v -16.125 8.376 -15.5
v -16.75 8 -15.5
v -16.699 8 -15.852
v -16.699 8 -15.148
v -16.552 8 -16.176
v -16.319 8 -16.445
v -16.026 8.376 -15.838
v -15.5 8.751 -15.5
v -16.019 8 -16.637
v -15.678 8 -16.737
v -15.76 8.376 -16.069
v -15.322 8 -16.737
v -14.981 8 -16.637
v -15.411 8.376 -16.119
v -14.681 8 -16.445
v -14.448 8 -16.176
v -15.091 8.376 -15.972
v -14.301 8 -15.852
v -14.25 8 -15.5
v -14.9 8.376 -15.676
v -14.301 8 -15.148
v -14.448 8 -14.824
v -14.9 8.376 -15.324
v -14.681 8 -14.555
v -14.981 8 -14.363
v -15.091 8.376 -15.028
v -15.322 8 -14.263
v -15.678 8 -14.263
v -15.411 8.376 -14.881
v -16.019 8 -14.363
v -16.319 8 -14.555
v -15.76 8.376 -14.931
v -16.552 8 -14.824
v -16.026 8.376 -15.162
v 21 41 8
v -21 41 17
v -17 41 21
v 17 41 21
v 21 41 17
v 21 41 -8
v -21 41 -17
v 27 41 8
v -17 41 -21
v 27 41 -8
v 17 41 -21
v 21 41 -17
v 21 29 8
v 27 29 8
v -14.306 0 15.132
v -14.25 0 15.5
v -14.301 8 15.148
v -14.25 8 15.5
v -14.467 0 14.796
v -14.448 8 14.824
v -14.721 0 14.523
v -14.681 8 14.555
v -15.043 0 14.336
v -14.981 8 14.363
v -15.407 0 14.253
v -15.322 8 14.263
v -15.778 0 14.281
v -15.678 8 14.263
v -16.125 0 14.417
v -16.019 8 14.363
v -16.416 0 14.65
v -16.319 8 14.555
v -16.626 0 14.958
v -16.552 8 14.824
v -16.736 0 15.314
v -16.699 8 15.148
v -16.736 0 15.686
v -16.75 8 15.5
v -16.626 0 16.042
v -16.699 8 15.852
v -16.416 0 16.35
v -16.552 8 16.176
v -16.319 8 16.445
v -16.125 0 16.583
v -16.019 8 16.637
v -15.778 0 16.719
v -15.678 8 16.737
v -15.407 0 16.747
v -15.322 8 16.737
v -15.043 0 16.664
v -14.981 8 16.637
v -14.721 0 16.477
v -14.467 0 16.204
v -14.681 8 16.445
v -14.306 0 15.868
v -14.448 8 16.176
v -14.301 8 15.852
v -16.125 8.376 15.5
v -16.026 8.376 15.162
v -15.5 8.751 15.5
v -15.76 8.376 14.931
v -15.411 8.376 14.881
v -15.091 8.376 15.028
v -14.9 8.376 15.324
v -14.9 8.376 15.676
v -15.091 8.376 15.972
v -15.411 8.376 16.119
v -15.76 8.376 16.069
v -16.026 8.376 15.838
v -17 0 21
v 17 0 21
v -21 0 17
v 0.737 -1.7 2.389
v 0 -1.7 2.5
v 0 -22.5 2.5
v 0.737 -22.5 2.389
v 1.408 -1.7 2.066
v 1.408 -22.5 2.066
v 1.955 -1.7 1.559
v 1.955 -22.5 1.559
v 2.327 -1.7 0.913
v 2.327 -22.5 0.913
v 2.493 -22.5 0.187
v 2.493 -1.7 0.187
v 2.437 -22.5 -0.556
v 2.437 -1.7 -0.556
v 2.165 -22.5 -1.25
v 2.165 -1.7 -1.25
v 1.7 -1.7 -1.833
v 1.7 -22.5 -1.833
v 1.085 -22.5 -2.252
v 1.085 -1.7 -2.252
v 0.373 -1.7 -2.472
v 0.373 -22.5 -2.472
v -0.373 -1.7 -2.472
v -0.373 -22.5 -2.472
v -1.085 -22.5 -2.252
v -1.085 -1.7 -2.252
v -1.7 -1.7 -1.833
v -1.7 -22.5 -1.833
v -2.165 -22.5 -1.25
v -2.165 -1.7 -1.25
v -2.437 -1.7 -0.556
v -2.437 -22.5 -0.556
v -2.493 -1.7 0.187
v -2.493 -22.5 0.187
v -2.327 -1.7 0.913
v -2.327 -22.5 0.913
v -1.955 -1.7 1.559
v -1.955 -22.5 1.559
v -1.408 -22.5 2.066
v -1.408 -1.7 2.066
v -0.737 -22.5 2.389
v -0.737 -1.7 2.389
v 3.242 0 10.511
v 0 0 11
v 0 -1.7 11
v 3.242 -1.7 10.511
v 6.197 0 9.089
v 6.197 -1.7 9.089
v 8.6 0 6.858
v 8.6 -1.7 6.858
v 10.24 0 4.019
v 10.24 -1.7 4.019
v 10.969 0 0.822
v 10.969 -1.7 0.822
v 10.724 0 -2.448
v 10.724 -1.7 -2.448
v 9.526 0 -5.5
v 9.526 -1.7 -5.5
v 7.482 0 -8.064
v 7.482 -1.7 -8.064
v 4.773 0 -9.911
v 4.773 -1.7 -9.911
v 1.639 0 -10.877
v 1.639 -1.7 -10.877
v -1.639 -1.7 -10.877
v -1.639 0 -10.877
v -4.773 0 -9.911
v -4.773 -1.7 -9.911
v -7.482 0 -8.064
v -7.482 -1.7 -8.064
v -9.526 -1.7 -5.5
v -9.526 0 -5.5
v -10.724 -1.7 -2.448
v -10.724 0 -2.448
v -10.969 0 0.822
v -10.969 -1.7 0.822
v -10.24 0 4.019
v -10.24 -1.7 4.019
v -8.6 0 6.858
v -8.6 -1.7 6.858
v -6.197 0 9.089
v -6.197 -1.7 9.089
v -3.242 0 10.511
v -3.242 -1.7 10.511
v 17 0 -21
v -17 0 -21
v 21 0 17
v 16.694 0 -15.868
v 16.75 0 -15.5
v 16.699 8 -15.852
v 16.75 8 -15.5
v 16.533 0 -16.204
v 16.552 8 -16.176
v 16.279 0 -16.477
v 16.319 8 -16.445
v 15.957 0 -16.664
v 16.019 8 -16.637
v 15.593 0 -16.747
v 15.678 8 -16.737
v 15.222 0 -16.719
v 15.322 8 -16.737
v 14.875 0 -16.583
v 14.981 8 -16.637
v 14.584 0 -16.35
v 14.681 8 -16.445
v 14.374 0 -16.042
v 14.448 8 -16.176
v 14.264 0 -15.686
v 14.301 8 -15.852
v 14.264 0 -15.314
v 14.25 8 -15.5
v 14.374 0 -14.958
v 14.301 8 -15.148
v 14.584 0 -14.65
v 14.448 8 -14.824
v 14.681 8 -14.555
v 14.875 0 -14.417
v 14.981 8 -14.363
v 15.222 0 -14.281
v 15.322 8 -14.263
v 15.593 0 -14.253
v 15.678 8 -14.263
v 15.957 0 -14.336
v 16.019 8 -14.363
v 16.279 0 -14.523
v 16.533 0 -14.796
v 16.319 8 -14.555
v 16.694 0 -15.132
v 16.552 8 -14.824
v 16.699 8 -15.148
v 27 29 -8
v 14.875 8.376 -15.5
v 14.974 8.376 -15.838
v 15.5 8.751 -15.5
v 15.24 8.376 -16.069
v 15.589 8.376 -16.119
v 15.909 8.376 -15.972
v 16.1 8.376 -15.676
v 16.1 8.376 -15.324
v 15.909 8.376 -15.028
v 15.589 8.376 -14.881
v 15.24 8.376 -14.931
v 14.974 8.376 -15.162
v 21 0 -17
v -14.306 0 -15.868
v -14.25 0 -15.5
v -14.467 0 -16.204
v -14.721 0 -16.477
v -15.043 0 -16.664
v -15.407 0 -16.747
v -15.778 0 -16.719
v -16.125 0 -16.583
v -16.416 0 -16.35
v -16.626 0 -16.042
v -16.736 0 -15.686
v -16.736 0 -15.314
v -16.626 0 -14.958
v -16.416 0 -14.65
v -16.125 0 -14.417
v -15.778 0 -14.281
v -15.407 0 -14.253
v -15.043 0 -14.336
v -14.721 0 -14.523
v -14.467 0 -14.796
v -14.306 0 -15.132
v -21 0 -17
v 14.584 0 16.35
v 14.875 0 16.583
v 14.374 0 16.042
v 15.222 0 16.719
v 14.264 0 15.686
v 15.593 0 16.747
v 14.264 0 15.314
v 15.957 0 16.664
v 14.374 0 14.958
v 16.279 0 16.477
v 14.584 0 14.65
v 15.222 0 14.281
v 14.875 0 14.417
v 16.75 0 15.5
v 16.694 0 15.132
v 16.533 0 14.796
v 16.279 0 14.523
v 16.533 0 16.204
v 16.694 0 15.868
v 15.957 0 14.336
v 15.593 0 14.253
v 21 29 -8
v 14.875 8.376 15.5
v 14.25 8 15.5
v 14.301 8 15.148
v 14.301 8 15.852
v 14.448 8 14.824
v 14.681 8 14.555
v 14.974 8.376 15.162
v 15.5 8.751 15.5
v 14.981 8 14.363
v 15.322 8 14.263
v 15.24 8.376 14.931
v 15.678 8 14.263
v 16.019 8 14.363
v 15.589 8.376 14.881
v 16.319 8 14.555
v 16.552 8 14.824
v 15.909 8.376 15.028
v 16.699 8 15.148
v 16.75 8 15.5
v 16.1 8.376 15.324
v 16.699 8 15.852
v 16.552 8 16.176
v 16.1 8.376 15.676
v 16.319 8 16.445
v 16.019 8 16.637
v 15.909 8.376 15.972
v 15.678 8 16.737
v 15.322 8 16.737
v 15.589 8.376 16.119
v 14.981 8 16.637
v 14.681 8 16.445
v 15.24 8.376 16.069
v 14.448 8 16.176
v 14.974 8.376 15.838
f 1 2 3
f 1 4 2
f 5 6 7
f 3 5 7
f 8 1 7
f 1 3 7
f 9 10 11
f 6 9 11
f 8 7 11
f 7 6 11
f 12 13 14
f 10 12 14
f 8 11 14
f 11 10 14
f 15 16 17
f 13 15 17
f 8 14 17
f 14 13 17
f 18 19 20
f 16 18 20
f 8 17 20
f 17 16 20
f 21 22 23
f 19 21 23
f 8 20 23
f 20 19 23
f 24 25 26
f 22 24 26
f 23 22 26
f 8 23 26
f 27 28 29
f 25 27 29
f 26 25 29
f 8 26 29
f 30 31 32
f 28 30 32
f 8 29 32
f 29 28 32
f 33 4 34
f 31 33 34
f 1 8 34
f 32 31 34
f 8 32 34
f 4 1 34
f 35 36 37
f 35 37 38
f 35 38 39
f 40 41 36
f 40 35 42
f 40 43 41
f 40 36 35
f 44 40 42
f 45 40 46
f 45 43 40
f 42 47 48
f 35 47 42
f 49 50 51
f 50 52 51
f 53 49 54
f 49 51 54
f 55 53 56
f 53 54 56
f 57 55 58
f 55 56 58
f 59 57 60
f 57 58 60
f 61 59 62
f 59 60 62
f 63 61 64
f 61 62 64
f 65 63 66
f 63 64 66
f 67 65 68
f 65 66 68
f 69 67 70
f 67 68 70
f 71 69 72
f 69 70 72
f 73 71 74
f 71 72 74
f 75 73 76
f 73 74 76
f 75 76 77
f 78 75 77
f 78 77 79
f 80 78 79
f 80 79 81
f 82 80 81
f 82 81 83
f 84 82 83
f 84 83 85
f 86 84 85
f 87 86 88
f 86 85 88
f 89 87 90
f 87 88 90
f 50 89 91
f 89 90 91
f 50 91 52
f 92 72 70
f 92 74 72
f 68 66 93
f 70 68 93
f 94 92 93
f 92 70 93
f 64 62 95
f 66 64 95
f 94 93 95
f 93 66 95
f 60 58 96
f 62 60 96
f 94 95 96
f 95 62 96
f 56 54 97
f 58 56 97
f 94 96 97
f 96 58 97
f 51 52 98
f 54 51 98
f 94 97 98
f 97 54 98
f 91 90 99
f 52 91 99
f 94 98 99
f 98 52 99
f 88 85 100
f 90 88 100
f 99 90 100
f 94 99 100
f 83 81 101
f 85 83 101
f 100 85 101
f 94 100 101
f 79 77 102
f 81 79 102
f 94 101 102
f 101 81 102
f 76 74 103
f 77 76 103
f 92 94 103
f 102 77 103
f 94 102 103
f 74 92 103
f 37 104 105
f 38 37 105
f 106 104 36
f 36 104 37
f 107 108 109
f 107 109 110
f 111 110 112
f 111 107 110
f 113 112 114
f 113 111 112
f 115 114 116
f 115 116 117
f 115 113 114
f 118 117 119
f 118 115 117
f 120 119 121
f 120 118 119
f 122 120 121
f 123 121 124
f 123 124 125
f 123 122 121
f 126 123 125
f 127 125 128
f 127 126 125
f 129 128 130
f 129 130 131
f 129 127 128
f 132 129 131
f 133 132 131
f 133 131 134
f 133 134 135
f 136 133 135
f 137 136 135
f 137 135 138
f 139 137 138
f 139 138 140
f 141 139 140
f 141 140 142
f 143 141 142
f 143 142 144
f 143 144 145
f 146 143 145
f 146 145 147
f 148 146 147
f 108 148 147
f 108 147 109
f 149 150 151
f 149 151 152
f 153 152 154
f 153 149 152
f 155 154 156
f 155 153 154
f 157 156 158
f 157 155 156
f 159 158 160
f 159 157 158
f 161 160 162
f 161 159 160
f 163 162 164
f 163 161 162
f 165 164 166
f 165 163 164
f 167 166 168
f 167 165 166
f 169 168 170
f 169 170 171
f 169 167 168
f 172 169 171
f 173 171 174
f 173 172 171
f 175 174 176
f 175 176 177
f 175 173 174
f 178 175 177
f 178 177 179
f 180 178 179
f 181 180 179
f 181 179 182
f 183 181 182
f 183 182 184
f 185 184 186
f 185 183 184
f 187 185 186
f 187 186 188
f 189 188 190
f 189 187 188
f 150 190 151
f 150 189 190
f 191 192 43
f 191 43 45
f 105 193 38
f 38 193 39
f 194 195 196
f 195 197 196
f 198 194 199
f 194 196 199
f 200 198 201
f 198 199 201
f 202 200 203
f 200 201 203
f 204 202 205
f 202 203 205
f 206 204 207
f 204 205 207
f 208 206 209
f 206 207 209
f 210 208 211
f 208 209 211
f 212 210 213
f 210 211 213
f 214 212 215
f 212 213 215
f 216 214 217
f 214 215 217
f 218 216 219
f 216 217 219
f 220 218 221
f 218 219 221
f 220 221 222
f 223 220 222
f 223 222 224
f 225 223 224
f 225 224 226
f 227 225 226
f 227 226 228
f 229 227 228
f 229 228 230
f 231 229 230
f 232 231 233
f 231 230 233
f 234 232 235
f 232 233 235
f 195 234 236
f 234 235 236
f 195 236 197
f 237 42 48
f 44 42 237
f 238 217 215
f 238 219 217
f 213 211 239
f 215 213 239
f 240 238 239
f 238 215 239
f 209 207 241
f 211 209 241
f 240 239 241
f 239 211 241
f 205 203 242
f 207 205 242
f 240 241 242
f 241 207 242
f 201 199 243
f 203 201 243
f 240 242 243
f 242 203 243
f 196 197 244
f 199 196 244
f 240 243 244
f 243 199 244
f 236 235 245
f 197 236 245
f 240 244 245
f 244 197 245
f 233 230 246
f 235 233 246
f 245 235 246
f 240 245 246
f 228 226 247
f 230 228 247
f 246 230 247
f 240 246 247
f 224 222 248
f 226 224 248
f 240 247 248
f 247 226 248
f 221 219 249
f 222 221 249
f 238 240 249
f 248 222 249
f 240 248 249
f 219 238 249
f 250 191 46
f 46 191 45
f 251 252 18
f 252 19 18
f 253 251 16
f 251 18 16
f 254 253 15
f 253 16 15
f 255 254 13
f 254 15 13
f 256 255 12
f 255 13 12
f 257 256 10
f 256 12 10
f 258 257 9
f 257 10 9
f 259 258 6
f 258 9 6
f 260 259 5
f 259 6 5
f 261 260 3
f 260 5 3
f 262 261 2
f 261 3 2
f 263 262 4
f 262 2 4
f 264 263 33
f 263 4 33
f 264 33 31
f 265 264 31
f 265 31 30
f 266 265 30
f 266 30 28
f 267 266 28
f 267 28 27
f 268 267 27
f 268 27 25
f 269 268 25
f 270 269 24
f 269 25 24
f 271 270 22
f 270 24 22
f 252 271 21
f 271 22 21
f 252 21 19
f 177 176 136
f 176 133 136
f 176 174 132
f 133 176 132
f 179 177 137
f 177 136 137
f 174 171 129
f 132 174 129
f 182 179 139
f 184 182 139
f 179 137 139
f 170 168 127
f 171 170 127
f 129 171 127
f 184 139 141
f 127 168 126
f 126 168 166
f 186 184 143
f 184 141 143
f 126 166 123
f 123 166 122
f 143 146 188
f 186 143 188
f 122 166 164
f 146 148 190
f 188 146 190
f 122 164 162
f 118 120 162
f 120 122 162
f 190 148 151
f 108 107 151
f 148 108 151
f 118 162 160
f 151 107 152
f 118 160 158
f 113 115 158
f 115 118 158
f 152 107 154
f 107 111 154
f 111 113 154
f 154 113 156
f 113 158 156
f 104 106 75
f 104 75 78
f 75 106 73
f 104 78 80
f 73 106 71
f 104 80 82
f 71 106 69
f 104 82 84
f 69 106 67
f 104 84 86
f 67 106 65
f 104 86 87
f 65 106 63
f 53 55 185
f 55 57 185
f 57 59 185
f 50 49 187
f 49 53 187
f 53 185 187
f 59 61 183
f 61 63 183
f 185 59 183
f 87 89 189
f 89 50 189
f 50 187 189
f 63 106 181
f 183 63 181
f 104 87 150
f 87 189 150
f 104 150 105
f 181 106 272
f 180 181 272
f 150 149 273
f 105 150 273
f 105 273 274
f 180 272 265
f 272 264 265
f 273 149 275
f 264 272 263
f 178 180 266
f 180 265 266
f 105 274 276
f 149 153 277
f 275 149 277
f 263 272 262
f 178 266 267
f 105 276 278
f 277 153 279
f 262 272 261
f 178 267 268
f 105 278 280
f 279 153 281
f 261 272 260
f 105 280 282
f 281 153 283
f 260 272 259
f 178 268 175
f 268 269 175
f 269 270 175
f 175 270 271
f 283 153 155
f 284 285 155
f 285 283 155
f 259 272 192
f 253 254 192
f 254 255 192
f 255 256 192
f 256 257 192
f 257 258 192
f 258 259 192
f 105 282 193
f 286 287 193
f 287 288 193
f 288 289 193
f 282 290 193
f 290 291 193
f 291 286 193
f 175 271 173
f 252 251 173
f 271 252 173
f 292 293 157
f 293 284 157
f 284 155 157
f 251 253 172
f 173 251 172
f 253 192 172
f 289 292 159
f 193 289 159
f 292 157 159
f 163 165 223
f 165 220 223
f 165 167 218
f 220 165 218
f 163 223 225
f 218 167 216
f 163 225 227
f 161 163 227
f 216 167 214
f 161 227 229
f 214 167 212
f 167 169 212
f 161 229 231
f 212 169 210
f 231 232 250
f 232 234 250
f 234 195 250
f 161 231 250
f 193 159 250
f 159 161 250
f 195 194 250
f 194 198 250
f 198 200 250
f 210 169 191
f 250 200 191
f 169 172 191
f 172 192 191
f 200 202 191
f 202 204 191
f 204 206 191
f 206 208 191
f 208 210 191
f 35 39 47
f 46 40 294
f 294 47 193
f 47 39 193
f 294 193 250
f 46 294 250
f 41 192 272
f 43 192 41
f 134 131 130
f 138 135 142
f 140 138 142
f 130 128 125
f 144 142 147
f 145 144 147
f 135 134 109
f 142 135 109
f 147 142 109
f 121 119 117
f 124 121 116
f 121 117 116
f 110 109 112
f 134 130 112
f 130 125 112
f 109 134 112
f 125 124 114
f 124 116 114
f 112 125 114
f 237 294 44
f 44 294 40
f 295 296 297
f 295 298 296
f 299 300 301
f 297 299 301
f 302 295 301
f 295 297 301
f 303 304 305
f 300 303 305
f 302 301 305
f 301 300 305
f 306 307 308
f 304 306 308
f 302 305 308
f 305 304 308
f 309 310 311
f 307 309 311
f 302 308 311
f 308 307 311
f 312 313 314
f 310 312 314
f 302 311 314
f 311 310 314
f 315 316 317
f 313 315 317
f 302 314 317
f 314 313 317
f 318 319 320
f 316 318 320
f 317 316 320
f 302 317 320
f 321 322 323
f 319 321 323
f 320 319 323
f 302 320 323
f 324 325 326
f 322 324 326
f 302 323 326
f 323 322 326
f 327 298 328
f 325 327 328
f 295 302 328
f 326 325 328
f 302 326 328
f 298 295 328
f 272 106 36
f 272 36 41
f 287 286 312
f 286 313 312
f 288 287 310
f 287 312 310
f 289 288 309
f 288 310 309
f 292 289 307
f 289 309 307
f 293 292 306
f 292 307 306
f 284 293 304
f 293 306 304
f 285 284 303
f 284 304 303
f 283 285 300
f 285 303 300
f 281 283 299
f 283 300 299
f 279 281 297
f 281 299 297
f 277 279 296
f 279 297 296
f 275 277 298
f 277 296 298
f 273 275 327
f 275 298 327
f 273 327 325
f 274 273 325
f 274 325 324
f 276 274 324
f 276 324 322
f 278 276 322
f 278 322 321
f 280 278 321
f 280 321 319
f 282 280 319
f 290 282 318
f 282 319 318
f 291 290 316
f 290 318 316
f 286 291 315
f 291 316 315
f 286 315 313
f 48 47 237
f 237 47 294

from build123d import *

# Parameters (mm, degrees)
SKETCH1_W                   = 42
SKETCH1_H                   = 42
BOSS_EXTRUDE1_DEPTH         = 41
CHAMFER1_SIZE               = 4
SKETCH2_R                   = 11
BOSS_EXTRUDE2_DEPTH         = 1.7
SKETCH3_R                   = 2.5
BOSS_EXTRUDE3_DEPTH         = 22.5
SKETCH4_W                   = 16
SKETCH4_H                   = 12
BOSS_EXTRUDE4_DEPTH         = 6
TAP_DRILL_FOR_M3_TAP1_D     = 2.5
TAP_DRILL_FOR_M3_TAP1_DEPTH = 8
TAP_DRILL_FOR_M3_TAP1_TIP   = 0.751075774


with BuildPart() as part:
    # Sketch1 → Boss-Extrude1 (new body)
    with BuildSketch(Plane(origin=(0, 0, 0), x_dir=(1, 0, 0), z_dir=(0, 1, 0))):
        Rectangle(SKETCH1_W, SKETCH1_H)
    extrude(amount=BOSS_EXTRUDE1_DEPTH)

    # Chamfer1
    chamfer1_edges = [part.edges().sort_by_distance(p)[0] for p in [
        (21, 20.5, 21),
        (-21, 20.5, 21),
        (-21, 20.5, -21),
        (21, 20.5, -21),
    ]]
    chamfer(chamfer1_edges, length=CHAMFER1_SIZE)

    # Sketch2 → Boss-Extrude2 (add)
    with BuildSketch(Plane(origin=(0, 0, 0), x_dir=(1, 0, 0), z_dir=(0, 1, 0))):
        with Locations(Location((0, 0, 0), (0, 0, 270))):
            Circle(SKETCH2_R)
    extrude(amount=-BOSS_EXTRUDE2_DEPTH)

    # Sketch3 → Boss-Extrude3 (add)
    with BuildSketch(Plane(origin=(0, 0, 0), x_dir=(1, 0, 0), z_dir=(0, 1, 0))):
        with Locations(Location((0, 0, 0), (0, 0, 270))):
            Circle(SKETCH3_R)
    extrude(amount=-BOSS_EXTRUDE3_DEPTH)

    # Sketch4 → Boss-Extrude4 (add)
    with BuildSketch(Plane(origin=(21, 0, 0), x_dir=(0, 0, -1), z_dir=(1, 0, 0))):
        with Locations((0, 35)):
            Rectangle(SKETCH4_W, SKETCH4_H)
    extrude(amount=BOSS_EXTRUDE4_DEPTH)

    # Tap Drill for M3 Tap1
    with Locations(Plane(origin=(0, 0, 0), x_dir=(-1, 0, 0), z_dir=(0, -1, 0))):
        with Locations((-15.5, -15.5), (15.5, -15.5), (15.5, 15.5), (-15.5, 15.5)):
            Hole(TAP_DRILL_FOR_M3_TAP1_D / 2, depth=TAP_DRILL_FOR_M3_TAP1_DEPTH)
            with Locations((0, 0, -(TAP_DRILL_FOR_M3_TAP1_DEPTH + TAP_DRILL_FOR_M3_TAP1_TIP / 2))):  # 118° drill point
                Cone(0, TAP_DRILL_FOR_M3_TAP1_D / 2, TAP_DRILL_FOR_M3_TAP1_TIP, mode=Mode.SUBTRACT)


solid = part.part
